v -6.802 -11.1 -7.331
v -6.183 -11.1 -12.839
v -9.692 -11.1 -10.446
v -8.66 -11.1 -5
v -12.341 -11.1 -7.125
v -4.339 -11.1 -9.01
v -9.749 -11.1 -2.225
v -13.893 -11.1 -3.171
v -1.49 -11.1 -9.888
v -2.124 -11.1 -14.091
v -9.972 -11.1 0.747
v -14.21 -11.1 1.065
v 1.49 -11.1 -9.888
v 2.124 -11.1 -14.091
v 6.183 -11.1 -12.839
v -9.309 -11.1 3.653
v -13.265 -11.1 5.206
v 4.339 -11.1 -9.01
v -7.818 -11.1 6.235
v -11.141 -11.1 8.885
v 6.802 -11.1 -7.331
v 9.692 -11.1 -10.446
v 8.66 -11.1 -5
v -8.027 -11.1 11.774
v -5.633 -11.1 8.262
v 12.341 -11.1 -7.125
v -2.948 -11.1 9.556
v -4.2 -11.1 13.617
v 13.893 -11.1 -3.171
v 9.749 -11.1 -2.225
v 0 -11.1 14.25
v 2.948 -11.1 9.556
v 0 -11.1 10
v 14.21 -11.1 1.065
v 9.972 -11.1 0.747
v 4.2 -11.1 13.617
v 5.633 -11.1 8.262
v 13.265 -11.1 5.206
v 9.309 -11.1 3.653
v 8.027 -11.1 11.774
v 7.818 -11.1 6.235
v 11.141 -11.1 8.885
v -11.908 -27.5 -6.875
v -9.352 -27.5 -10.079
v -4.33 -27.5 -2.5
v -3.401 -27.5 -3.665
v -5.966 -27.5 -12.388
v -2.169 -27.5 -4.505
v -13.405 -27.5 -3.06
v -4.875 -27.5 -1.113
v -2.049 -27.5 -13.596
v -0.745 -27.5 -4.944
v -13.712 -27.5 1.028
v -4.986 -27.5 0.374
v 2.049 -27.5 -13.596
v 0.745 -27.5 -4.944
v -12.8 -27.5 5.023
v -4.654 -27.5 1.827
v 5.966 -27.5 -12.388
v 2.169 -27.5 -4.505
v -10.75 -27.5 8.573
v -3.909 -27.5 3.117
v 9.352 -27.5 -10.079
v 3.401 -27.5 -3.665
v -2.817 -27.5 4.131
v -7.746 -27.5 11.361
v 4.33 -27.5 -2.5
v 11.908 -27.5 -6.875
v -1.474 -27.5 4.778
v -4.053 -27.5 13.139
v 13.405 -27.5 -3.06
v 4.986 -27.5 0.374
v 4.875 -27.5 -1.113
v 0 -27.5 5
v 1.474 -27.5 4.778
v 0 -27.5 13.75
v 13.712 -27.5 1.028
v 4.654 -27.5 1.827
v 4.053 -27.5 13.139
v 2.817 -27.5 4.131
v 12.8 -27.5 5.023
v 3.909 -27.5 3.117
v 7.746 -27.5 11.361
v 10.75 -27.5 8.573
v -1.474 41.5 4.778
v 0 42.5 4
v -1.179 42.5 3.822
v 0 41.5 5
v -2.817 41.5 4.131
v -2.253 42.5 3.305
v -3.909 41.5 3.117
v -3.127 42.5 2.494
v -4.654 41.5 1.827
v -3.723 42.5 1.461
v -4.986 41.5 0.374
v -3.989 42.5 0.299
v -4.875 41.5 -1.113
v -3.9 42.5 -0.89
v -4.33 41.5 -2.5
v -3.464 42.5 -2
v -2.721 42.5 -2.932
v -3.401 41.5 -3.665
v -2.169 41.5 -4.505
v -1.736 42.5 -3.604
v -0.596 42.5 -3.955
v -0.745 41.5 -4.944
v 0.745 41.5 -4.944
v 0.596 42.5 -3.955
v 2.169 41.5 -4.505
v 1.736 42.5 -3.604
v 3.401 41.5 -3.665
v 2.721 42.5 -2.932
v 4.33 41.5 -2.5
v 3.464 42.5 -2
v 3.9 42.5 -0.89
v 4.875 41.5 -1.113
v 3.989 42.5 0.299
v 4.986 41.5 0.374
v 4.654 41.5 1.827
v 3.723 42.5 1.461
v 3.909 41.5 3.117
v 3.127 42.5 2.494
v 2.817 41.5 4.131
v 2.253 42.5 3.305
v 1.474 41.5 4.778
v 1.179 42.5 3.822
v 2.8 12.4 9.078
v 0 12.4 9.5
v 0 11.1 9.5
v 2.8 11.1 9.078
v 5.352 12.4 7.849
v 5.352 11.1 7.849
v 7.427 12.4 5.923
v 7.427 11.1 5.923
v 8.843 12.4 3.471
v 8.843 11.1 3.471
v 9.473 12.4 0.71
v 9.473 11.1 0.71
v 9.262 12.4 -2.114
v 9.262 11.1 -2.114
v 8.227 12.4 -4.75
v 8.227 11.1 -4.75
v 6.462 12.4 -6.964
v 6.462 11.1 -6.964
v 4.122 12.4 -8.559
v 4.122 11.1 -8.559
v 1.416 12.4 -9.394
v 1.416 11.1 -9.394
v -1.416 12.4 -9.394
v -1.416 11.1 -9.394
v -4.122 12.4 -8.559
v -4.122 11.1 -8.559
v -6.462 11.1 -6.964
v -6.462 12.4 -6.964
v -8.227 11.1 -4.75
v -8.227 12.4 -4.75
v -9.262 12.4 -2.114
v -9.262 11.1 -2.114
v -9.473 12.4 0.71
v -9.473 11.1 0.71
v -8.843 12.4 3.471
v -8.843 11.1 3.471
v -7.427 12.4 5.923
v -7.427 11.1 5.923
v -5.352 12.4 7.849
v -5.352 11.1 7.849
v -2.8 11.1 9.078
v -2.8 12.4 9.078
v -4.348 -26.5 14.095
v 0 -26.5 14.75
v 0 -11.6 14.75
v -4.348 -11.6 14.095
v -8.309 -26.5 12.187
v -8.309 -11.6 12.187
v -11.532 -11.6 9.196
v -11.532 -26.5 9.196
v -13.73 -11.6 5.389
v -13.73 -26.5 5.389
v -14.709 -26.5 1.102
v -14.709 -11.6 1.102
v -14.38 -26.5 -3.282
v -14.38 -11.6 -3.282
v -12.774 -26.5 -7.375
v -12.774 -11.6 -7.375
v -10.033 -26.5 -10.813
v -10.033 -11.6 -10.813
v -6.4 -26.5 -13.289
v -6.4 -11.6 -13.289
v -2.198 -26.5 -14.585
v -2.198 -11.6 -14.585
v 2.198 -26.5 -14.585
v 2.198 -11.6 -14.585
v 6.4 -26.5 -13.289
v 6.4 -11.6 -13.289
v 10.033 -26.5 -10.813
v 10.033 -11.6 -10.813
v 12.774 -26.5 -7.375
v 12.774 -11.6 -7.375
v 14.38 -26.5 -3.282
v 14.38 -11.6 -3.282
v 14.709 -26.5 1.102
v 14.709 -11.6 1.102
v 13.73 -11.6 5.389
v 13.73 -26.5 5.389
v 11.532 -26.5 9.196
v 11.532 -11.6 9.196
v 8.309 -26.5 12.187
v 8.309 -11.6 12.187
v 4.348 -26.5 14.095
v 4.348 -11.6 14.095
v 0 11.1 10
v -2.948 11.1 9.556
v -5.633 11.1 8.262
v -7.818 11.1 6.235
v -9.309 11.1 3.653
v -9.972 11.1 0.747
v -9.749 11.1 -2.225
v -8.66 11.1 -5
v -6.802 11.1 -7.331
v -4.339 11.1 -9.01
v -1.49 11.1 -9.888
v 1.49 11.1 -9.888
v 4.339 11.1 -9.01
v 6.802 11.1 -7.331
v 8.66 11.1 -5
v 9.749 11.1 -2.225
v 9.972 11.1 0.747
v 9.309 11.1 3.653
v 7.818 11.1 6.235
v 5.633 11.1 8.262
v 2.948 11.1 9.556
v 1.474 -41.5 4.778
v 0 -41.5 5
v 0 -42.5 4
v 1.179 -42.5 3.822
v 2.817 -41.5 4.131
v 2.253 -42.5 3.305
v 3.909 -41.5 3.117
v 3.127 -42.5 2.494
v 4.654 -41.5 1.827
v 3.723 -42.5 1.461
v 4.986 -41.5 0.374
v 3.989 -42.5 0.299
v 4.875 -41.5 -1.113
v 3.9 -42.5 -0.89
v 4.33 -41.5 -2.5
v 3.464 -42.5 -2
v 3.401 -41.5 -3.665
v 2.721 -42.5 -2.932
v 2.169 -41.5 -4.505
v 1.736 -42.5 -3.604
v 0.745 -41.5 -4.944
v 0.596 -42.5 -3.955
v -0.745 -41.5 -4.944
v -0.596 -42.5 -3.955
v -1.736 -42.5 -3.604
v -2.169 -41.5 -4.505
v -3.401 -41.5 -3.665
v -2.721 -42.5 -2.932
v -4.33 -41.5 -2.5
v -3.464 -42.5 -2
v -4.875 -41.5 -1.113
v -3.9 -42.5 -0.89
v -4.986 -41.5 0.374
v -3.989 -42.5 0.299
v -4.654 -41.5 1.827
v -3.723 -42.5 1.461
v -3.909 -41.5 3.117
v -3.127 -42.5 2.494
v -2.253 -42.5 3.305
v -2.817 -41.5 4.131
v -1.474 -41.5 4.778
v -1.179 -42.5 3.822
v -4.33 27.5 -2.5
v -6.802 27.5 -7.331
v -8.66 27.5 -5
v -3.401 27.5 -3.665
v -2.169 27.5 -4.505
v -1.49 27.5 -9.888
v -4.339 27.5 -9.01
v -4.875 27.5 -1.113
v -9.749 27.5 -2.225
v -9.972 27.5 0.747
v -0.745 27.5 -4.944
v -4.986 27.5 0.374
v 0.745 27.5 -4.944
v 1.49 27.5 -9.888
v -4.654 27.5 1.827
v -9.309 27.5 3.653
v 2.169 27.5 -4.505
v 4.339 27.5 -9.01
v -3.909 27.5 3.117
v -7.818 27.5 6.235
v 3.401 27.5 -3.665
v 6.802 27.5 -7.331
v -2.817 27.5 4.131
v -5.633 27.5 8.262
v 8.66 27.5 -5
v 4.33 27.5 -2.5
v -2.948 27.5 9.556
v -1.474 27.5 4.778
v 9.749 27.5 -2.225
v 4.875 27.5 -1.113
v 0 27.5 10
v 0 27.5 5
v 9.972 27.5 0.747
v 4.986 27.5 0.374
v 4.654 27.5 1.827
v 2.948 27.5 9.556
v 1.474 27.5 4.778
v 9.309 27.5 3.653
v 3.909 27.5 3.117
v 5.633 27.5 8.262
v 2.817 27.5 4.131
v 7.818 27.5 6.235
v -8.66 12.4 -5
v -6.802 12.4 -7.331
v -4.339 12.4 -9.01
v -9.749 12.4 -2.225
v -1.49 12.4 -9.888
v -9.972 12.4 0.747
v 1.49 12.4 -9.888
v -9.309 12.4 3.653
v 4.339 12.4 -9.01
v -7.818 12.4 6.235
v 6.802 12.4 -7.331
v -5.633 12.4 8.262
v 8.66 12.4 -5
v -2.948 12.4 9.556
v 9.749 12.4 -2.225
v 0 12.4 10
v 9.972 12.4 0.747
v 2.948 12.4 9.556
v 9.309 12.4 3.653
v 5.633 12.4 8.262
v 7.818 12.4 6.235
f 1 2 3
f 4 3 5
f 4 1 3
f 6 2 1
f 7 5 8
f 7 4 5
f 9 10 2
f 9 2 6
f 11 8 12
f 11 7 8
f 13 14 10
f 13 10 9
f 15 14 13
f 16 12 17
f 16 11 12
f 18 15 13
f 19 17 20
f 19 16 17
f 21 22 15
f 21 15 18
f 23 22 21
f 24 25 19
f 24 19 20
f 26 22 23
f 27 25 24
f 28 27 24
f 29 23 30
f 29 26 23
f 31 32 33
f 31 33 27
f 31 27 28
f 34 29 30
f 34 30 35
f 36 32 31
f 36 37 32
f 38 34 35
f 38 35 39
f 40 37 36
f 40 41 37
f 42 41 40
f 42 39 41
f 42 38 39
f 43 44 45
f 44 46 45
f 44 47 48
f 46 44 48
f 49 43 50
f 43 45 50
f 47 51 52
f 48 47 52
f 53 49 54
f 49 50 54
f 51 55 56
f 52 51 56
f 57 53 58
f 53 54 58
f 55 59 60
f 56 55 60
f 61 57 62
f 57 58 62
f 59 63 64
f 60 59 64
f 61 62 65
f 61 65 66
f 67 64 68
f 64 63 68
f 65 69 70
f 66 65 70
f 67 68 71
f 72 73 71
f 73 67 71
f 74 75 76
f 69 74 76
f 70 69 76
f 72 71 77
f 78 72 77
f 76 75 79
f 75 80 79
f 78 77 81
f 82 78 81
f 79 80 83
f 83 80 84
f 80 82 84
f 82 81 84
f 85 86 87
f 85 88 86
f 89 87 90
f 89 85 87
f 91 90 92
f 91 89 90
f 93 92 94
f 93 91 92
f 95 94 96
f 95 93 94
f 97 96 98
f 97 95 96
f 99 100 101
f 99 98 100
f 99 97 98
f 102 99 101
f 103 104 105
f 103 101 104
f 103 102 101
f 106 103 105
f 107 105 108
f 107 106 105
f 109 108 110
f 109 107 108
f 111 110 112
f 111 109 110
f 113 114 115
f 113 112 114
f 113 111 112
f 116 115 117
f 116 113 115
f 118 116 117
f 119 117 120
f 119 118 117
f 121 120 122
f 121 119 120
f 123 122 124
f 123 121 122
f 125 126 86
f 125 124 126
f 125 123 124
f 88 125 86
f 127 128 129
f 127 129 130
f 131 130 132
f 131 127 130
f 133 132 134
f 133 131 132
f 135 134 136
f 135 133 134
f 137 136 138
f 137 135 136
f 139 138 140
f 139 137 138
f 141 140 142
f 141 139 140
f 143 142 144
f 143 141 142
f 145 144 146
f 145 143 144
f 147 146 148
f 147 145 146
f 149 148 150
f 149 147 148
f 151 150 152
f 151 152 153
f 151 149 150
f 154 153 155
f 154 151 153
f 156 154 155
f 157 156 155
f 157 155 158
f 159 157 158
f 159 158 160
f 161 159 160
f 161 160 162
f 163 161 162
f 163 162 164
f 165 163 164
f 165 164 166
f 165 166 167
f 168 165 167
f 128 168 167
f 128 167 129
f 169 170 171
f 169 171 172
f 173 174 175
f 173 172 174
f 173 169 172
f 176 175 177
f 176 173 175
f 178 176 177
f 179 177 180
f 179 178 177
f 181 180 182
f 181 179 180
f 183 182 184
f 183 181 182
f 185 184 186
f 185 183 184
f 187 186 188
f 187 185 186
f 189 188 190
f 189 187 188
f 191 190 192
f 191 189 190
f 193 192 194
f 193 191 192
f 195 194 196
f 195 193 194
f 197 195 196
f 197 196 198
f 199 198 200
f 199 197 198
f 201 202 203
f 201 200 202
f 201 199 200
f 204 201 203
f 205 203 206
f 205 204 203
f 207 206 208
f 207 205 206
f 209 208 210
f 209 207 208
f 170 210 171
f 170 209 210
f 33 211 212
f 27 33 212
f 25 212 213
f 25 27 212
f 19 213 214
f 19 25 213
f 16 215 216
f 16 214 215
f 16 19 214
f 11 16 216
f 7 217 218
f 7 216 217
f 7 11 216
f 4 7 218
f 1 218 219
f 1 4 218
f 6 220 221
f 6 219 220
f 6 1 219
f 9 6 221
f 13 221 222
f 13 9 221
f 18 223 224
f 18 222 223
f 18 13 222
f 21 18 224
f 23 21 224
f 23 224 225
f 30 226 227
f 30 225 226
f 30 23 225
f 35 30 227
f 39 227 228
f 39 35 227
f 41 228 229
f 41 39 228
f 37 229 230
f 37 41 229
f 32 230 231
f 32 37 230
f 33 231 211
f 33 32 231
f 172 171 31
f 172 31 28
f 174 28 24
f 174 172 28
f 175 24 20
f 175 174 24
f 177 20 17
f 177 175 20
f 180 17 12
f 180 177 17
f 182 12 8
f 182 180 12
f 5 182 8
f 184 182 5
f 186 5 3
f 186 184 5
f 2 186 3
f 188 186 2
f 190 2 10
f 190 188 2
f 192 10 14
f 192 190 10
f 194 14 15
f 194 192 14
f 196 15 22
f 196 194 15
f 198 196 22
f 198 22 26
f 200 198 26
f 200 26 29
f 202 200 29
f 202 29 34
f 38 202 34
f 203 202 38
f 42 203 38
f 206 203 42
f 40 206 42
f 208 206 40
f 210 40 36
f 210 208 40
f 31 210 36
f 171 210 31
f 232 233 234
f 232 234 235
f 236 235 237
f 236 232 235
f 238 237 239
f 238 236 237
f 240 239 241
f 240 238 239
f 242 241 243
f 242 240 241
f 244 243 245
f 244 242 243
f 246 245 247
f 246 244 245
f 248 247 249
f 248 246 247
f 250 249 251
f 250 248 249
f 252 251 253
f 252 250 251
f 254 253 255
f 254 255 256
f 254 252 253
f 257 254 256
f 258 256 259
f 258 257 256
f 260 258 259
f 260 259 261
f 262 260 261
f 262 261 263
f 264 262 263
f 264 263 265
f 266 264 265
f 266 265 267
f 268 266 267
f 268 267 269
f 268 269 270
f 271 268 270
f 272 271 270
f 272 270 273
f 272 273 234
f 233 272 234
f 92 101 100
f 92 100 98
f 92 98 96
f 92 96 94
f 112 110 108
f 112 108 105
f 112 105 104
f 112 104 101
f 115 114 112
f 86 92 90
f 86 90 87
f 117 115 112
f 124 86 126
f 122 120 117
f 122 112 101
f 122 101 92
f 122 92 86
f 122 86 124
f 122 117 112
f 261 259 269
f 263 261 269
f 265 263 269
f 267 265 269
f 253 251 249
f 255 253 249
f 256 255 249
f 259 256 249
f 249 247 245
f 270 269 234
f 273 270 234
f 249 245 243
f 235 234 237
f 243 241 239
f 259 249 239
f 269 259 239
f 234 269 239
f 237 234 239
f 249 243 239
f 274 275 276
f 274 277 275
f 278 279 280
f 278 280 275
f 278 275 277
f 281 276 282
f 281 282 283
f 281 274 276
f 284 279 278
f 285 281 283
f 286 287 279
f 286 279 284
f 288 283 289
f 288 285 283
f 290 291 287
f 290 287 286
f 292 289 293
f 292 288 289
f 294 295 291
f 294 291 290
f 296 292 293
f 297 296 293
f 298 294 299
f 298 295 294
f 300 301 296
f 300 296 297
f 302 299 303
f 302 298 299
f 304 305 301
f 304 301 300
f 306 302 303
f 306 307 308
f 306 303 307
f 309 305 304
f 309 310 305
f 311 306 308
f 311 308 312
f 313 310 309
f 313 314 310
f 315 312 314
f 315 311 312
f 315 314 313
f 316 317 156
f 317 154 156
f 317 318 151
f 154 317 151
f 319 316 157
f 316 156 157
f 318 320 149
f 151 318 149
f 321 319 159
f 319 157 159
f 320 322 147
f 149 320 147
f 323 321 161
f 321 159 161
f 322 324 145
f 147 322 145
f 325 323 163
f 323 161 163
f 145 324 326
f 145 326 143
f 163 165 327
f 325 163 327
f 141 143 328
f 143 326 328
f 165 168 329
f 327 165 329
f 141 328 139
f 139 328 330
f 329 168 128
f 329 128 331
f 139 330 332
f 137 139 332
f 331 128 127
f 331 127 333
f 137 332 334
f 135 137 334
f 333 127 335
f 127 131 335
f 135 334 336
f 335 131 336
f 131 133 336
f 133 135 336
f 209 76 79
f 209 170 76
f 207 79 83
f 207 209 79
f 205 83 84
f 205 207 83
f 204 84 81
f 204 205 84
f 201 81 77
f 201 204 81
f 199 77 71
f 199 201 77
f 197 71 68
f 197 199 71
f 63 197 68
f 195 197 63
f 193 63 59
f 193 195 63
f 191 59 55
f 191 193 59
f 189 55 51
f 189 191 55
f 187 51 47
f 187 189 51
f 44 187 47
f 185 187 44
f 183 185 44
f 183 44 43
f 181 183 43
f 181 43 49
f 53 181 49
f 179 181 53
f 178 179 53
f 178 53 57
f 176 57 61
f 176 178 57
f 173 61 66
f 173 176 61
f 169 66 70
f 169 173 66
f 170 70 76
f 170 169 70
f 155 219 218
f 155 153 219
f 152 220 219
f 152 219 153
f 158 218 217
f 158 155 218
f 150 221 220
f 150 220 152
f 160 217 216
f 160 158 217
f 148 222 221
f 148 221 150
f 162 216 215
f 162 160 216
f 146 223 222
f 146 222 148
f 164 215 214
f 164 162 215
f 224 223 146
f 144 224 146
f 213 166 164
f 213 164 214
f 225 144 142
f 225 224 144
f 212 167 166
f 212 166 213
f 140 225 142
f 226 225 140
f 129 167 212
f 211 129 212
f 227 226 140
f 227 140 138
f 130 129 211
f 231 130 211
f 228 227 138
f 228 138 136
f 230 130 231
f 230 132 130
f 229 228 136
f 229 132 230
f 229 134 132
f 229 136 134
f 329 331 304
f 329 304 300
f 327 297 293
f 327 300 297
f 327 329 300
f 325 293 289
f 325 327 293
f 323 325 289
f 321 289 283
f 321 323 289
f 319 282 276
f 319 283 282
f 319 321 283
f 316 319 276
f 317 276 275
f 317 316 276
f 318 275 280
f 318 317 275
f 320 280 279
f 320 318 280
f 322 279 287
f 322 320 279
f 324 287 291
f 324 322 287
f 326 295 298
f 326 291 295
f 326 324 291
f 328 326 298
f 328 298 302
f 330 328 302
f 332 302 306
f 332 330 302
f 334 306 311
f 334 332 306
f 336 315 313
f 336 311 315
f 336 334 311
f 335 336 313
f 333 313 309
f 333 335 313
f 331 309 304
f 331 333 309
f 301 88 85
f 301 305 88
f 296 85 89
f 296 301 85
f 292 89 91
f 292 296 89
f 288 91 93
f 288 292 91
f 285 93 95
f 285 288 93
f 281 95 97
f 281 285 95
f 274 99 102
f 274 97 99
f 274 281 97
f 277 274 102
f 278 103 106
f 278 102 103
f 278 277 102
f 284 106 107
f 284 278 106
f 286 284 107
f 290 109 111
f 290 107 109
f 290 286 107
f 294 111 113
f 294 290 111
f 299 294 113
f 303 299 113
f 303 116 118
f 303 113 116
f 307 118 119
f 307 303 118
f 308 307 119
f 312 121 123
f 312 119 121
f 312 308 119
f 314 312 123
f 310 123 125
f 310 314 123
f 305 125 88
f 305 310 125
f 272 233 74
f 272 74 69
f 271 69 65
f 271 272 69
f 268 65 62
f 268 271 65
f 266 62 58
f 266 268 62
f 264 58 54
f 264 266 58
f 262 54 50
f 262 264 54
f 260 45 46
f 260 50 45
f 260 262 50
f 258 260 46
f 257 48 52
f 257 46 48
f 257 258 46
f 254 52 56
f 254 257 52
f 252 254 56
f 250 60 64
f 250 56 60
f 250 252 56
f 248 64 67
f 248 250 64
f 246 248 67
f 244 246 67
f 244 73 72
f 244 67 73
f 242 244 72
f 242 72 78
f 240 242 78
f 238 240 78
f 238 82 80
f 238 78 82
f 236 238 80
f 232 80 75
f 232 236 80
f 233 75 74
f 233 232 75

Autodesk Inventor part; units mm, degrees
ref_plane "YZ Plane" through (0, 0, 0) normal (1, 0, 0) x (0, 1, 0)
ref_plane "XZ Plane" through (0, 0, 0) normal (0, 1, 0) x (-1, 0, 0)
ref_plane "XY Plane" through (0, 0, 0) normal (0, 0, 1) x (1, 0, 0)
sketch "Skizze1" plane through (0, 0, 0) normal (1, 0, 0) x (0, 1, 0)
  line L0 (0, 17.7) -> (0, -2.95) construction
  line L1 (-59.5, 0) -> (59.5, 0) projected
  line L2 (42.5, 5) -> (42.5, 0)
  line L3 (42.5, 5) -> (27.5, 5)
  line L4 (27.5, 5) -> (27.5, 10)
  line L5 (27.5, 10) -> (-11.1, 10)
  line L6 (-11.1, 10) -> (-11.1, 14.75)
  line L7 (-11.1, 14.75) -> (-27.5, 14.75)
  line L8 (-27.5, 14.75) -> (-27.5, 5)
  line L9 (-27.5, 5) -> (-42.5, 5)
  line L10 (-42.5, 5) -> (-42.5, 0)
  line L11 (-11.1, 14.75) -> (11.1, 14.75) construction
  line L12 (11.1, 14.75) -> (11.1, 10) construction
  line L13 (-42.5, 0) -> (42.5, 0)
  point P0 (0, 0)
  dimension "d0" = 10
  dimension "d1" = 15
  dimension "d2" = 22.2
  dimension "d3" = 55
  dimension "d4" = 20
  dimension "d5" = 29.5
revolve "Grundkörper" add sketch "Skizze1" angle 360 about axis through (0, 0, 0) along (0, 1, 0)
sketch "Skizze2" plane through (0, 0, 0) normal (1, 0, 0) x (0, 1, 0)
  line L0 (-18.82, 0) -> (35.22, 0) construction
  line L1 (-11.1, -14.75) -> (-11.1, 14.75) construction
  line L2 (-11.1, 10) -> (27.5, 10) projected
  line L3 (-11.1, 10) -> (-11.1, 14.75)
  line L4 (-11.1, 14.75) -> (11.1, 14.75)
  line L5 (11.1, 14.75) -> (11.1, 10)
  line L6 (11.1, 10) -> (-11.1, 10)
  line L7 (0, 20.65) -> (0, -20.65) construction
  line L8 (11.1, 10) -> (11.1, 9.5)
  line L9 (11.1, 9.5) -> (12.4, 9.5)
  line L10 (12.4, 9.5) -> (12.4, 10)
  line L11 (11.1, 10) -> (12.4, 10)
  point P0 (0, 0)
  dimension "d15" = 1.3
  dimension "d16" = 19
revolve "Nut_Sicherungsring_DIN471-20x1,2" cut sketch "Skizze2" angle 360 about axis through (0, 0, 0) along (0, 1, 0) contours L2 L10 L9 L8
chamfer "FaseAllgemein" distance 1 angle 45 3 edges at (0, -42.5, -5) (0, 42.5, -5) (0, -27.5, -14.75)
chamfer "FaseLager" distance 0.5 angle 45 1 edges at (0, -11.1, -14.75)
properties part number "200-40-BOGIE-CONNECTOR-05" material "Aluminium 6061"
